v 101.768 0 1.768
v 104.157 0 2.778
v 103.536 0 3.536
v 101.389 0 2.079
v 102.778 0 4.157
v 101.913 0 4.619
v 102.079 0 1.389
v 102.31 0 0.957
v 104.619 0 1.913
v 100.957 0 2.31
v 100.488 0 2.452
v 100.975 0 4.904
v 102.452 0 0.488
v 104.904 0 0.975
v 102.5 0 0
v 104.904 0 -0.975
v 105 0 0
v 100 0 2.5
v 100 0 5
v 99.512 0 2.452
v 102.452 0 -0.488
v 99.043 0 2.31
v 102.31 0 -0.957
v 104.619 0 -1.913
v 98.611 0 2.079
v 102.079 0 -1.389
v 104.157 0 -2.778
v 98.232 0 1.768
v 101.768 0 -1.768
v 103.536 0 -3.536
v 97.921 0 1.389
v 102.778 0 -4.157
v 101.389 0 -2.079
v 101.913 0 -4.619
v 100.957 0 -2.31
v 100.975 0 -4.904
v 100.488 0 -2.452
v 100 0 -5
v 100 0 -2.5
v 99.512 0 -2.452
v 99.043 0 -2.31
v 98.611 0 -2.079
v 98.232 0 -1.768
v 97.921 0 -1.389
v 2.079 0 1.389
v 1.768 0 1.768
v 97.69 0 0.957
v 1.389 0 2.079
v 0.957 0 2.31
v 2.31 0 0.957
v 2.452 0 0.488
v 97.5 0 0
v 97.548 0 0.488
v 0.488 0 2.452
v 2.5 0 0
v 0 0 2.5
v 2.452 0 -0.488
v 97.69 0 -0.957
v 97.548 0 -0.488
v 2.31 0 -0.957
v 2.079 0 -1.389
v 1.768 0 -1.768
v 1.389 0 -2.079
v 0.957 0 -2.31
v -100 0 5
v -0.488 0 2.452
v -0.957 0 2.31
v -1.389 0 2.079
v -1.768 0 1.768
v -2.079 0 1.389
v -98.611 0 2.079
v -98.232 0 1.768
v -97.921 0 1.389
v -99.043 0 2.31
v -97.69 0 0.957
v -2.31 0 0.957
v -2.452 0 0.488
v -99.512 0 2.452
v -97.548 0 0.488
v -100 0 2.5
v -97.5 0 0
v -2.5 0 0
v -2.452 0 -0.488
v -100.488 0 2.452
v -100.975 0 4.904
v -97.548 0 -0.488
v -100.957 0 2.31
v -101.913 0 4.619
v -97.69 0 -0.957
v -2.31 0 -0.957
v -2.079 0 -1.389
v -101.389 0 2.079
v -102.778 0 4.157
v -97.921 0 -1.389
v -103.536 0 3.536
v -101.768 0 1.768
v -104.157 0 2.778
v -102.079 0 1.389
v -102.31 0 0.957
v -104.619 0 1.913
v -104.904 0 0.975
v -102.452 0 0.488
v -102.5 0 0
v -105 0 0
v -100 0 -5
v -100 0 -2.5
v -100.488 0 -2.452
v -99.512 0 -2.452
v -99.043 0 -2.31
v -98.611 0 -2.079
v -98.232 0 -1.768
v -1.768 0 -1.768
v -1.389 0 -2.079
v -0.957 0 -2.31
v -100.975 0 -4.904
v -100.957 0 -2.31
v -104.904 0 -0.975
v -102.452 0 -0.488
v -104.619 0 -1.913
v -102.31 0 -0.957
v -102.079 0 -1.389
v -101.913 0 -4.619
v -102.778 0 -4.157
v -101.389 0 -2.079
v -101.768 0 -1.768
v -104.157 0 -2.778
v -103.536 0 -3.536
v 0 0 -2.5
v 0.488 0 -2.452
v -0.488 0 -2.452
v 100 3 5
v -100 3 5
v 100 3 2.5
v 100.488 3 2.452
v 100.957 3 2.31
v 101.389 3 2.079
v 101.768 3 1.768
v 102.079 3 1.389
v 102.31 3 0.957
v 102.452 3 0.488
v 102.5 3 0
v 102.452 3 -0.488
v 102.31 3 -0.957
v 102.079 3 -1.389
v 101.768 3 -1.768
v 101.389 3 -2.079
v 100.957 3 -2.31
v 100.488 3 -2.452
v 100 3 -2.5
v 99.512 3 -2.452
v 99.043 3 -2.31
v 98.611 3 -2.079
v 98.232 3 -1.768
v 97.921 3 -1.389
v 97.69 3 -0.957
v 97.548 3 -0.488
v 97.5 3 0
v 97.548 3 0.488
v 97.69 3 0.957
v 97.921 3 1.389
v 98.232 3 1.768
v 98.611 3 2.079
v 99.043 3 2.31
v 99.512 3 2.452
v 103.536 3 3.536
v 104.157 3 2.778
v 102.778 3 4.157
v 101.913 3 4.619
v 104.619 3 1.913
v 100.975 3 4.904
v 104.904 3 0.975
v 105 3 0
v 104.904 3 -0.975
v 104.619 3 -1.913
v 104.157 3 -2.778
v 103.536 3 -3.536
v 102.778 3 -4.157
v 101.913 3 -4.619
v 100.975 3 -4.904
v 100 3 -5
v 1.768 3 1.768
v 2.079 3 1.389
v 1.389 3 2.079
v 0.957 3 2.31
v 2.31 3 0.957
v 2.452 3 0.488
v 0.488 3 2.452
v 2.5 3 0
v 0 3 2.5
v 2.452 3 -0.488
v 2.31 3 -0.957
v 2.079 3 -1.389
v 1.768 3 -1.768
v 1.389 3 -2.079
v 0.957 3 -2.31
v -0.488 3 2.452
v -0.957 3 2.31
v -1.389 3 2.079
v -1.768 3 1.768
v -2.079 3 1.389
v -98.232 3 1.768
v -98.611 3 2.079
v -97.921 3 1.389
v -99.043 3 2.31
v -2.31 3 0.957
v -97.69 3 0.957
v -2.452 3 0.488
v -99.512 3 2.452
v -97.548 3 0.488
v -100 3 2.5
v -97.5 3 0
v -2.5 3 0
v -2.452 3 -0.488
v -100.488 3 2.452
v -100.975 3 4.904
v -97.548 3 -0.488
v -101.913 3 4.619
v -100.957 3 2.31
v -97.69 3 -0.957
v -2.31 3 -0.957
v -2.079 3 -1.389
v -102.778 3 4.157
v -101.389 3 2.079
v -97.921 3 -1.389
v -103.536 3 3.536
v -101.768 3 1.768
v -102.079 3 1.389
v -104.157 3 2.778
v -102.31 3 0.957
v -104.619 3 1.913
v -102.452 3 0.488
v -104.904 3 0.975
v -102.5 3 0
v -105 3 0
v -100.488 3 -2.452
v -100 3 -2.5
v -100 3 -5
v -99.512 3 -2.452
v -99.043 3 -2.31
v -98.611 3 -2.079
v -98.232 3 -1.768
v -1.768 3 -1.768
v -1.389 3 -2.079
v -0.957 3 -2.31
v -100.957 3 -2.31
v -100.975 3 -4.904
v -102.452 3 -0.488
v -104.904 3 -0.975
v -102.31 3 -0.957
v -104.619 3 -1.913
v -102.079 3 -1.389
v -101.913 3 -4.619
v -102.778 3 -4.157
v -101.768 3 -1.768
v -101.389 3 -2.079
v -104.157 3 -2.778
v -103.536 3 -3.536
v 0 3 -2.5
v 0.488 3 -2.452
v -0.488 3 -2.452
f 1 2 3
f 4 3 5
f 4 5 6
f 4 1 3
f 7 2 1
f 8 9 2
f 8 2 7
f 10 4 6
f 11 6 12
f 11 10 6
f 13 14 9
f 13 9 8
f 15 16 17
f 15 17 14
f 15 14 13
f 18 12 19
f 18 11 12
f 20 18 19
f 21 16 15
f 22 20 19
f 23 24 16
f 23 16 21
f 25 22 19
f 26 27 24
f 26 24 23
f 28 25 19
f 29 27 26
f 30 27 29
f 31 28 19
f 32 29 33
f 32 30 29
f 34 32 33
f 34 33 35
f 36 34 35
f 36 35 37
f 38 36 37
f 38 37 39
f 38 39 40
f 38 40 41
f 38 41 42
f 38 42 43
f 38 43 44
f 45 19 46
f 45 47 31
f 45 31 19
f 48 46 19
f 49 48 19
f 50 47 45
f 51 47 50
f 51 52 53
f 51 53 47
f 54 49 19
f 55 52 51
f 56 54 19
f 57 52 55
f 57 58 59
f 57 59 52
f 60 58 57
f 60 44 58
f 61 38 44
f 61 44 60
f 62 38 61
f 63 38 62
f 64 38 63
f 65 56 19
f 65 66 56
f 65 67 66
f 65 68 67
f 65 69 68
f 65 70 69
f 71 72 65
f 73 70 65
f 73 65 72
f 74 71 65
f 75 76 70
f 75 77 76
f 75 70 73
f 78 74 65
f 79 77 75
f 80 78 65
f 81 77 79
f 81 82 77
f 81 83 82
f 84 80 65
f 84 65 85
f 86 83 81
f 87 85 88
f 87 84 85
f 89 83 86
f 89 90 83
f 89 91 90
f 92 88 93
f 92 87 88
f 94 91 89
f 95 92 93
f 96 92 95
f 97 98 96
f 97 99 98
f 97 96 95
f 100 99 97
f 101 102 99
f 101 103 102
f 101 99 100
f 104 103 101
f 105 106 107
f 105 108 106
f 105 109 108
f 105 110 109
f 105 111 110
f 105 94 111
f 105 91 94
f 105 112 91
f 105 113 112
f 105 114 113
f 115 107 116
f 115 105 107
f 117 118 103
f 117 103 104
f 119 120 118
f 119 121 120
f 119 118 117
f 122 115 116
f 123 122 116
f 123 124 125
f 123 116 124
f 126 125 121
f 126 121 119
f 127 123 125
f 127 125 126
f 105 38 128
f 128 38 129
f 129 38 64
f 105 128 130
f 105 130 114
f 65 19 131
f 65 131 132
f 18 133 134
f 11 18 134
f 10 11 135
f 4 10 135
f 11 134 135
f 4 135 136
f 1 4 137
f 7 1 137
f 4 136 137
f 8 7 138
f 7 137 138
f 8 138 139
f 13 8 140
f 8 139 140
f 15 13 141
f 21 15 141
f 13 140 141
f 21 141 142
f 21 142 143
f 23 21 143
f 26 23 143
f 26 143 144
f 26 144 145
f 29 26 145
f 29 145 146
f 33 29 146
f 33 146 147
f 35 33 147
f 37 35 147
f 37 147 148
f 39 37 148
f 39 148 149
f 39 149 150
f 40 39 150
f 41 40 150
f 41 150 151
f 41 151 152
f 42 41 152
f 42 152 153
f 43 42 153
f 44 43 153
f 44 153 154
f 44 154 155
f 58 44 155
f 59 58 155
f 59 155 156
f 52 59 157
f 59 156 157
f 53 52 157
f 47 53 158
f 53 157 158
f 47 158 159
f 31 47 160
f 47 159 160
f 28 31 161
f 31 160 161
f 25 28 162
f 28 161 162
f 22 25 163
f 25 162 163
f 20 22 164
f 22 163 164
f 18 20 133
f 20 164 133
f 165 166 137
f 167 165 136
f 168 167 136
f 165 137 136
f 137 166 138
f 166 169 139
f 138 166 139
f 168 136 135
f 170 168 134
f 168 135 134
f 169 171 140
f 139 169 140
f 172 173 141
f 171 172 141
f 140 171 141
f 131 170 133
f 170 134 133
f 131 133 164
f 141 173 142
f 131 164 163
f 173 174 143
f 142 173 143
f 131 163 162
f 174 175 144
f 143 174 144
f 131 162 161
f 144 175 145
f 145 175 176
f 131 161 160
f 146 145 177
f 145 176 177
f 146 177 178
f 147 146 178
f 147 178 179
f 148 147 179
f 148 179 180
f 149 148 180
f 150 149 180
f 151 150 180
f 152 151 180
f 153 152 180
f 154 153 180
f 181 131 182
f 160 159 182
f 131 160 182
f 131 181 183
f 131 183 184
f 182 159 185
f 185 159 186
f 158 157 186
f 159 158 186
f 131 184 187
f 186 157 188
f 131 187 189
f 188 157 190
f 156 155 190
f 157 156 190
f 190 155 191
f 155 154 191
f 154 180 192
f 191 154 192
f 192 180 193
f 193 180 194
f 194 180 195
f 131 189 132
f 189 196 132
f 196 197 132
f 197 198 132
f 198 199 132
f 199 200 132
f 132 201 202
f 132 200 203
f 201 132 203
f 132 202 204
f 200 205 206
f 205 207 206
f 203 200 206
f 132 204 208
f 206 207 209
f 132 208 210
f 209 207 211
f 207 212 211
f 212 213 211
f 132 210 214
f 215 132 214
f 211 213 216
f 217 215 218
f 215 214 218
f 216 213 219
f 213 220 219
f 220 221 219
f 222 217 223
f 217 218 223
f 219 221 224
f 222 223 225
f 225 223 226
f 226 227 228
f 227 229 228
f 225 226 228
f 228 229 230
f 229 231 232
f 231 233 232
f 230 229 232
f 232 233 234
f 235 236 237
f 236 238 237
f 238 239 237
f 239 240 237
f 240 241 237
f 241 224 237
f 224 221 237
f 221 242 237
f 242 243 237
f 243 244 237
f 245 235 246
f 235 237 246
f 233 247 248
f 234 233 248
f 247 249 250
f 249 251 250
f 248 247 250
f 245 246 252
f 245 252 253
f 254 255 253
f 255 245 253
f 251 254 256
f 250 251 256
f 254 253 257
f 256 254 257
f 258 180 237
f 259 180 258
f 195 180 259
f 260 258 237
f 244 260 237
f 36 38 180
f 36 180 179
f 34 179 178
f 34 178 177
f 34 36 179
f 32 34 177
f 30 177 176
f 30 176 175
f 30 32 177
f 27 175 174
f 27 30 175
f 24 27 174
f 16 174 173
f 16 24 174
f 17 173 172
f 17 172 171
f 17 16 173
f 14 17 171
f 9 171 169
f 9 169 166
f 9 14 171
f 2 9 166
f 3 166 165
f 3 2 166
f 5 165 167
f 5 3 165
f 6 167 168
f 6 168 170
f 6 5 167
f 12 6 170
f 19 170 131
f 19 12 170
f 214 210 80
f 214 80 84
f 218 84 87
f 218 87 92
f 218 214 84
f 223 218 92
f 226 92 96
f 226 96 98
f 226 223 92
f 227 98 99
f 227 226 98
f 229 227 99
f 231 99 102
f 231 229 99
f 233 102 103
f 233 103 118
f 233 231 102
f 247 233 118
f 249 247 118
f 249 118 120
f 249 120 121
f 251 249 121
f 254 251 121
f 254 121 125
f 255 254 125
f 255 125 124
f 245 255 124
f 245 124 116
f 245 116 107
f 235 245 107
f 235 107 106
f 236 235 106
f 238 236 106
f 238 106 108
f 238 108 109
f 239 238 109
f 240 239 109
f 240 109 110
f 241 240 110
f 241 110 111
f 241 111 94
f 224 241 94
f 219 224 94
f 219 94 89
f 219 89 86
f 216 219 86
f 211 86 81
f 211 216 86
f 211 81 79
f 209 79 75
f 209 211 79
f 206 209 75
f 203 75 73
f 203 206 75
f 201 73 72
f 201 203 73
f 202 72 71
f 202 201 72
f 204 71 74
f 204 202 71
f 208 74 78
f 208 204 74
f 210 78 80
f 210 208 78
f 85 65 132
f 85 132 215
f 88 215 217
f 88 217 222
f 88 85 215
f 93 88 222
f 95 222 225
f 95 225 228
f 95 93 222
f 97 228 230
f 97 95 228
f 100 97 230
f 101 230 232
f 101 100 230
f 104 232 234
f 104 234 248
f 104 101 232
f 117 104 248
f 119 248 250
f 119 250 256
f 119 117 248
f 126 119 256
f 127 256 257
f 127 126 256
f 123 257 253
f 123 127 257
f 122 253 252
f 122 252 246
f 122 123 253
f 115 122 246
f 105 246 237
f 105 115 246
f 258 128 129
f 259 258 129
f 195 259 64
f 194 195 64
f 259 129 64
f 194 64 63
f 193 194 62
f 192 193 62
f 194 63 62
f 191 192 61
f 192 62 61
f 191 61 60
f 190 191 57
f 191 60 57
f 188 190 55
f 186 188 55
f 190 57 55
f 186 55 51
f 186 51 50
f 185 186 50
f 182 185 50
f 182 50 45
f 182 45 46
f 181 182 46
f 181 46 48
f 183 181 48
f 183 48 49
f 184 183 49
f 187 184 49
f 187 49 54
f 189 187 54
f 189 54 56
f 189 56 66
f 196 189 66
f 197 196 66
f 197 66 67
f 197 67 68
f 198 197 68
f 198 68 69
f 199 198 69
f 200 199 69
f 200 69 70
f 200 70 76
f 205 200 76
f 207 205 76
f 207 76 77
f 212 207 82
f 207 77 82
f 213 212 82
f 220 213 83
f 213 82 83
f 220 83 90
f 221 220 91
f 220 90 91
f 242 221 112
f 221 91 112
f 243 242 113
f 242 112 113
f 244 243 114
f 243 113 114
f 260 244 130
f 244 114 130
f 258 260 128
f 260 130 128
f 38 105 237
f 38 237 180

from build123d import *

# Parameters (mm, degrees)
BOSS_EXTRUDE1_DEPTH = 3
CUT_EXTRUDE1_REACH  = 107.162
SKETCH3_R           = 2.5
CUT_EXTRUDE2_REACH  = 107.162
SKETCH5_R           = 2.5


with BuildPart() as part:
    # Sketch2 → Boss-Extrude1 (new body)
    with BuildSketch(Plane(origin=(0, 0, 0), x_dir=(1, 0, 0), z_dir=(0, 1, 0))):
        with BuildLine():
            Line((-100, 5), (100, 5))
            ThreePointArc((100, 5), (105, 0), (100, -5))
            Line((100, -5), (-100, -5))
            ThreePointArc((-100, -5), (-105, 0), (-100, 5))
        make_face()
    extrude(amount=BOSS_EXTRUDE1_DEPTH)

    # Sketch3 → Cut-Extrude1 (cut, up to next)
    with BuildSketch(Plane(origin=(0, 3, 0), x_dir=(1, 0, 0), z_dir=(0, 1, 0)), mode=Mode.PRIVATE) as cut_extrude1_sk1:
        with Locations(Location((100, 0, 0), (0, 0, 270))):
            Circle(SKETCH3_R)
    cut_extrude1_tool1 = extrude(cut_extrude1_sk1.sketch, amount=-CUT_EXTRUDE1_REACH, mode=Mode.PRIVATE) & part.part
    cut_extrude1 = cut_extrude1_tool1.solids().sort_by_distance((100, 3, 0))[0]
    add(cut_extrude1, mode=Mode.SUBTRACT)

    # Mirror1: Cut-Extrude1 across plane
    add(cut_extrude1.mirror(Plane(origin=(0, 0, 0), x_dir=(0, 0, 1), z_dir=(1, 0, 0))), mode=Mode.SUBTRACT)

    # Sketch5 → Cut-Extrude2 (cut, up to next)
    with BuildSketch(Plane.XZ, mode=Mode.PRIVATE) as cut_extrude2_sk1:
        with Locations(Location((0, 0, 0), (0, 0, 270))):
            Circle(SKETCH5_R)
    cut_extrude2_tool1 = extrude(cut_extrude2_sk1.sketch, amount=-CUT_EXTRUDE2_REACH, mode=Mode.PRIVATE) & part.part
    add(cut_extrude2_tool1.solids().sort_by_distance((0, 0, 0))[0], mode=Mode.SUBTRACT)


solid = part.part
